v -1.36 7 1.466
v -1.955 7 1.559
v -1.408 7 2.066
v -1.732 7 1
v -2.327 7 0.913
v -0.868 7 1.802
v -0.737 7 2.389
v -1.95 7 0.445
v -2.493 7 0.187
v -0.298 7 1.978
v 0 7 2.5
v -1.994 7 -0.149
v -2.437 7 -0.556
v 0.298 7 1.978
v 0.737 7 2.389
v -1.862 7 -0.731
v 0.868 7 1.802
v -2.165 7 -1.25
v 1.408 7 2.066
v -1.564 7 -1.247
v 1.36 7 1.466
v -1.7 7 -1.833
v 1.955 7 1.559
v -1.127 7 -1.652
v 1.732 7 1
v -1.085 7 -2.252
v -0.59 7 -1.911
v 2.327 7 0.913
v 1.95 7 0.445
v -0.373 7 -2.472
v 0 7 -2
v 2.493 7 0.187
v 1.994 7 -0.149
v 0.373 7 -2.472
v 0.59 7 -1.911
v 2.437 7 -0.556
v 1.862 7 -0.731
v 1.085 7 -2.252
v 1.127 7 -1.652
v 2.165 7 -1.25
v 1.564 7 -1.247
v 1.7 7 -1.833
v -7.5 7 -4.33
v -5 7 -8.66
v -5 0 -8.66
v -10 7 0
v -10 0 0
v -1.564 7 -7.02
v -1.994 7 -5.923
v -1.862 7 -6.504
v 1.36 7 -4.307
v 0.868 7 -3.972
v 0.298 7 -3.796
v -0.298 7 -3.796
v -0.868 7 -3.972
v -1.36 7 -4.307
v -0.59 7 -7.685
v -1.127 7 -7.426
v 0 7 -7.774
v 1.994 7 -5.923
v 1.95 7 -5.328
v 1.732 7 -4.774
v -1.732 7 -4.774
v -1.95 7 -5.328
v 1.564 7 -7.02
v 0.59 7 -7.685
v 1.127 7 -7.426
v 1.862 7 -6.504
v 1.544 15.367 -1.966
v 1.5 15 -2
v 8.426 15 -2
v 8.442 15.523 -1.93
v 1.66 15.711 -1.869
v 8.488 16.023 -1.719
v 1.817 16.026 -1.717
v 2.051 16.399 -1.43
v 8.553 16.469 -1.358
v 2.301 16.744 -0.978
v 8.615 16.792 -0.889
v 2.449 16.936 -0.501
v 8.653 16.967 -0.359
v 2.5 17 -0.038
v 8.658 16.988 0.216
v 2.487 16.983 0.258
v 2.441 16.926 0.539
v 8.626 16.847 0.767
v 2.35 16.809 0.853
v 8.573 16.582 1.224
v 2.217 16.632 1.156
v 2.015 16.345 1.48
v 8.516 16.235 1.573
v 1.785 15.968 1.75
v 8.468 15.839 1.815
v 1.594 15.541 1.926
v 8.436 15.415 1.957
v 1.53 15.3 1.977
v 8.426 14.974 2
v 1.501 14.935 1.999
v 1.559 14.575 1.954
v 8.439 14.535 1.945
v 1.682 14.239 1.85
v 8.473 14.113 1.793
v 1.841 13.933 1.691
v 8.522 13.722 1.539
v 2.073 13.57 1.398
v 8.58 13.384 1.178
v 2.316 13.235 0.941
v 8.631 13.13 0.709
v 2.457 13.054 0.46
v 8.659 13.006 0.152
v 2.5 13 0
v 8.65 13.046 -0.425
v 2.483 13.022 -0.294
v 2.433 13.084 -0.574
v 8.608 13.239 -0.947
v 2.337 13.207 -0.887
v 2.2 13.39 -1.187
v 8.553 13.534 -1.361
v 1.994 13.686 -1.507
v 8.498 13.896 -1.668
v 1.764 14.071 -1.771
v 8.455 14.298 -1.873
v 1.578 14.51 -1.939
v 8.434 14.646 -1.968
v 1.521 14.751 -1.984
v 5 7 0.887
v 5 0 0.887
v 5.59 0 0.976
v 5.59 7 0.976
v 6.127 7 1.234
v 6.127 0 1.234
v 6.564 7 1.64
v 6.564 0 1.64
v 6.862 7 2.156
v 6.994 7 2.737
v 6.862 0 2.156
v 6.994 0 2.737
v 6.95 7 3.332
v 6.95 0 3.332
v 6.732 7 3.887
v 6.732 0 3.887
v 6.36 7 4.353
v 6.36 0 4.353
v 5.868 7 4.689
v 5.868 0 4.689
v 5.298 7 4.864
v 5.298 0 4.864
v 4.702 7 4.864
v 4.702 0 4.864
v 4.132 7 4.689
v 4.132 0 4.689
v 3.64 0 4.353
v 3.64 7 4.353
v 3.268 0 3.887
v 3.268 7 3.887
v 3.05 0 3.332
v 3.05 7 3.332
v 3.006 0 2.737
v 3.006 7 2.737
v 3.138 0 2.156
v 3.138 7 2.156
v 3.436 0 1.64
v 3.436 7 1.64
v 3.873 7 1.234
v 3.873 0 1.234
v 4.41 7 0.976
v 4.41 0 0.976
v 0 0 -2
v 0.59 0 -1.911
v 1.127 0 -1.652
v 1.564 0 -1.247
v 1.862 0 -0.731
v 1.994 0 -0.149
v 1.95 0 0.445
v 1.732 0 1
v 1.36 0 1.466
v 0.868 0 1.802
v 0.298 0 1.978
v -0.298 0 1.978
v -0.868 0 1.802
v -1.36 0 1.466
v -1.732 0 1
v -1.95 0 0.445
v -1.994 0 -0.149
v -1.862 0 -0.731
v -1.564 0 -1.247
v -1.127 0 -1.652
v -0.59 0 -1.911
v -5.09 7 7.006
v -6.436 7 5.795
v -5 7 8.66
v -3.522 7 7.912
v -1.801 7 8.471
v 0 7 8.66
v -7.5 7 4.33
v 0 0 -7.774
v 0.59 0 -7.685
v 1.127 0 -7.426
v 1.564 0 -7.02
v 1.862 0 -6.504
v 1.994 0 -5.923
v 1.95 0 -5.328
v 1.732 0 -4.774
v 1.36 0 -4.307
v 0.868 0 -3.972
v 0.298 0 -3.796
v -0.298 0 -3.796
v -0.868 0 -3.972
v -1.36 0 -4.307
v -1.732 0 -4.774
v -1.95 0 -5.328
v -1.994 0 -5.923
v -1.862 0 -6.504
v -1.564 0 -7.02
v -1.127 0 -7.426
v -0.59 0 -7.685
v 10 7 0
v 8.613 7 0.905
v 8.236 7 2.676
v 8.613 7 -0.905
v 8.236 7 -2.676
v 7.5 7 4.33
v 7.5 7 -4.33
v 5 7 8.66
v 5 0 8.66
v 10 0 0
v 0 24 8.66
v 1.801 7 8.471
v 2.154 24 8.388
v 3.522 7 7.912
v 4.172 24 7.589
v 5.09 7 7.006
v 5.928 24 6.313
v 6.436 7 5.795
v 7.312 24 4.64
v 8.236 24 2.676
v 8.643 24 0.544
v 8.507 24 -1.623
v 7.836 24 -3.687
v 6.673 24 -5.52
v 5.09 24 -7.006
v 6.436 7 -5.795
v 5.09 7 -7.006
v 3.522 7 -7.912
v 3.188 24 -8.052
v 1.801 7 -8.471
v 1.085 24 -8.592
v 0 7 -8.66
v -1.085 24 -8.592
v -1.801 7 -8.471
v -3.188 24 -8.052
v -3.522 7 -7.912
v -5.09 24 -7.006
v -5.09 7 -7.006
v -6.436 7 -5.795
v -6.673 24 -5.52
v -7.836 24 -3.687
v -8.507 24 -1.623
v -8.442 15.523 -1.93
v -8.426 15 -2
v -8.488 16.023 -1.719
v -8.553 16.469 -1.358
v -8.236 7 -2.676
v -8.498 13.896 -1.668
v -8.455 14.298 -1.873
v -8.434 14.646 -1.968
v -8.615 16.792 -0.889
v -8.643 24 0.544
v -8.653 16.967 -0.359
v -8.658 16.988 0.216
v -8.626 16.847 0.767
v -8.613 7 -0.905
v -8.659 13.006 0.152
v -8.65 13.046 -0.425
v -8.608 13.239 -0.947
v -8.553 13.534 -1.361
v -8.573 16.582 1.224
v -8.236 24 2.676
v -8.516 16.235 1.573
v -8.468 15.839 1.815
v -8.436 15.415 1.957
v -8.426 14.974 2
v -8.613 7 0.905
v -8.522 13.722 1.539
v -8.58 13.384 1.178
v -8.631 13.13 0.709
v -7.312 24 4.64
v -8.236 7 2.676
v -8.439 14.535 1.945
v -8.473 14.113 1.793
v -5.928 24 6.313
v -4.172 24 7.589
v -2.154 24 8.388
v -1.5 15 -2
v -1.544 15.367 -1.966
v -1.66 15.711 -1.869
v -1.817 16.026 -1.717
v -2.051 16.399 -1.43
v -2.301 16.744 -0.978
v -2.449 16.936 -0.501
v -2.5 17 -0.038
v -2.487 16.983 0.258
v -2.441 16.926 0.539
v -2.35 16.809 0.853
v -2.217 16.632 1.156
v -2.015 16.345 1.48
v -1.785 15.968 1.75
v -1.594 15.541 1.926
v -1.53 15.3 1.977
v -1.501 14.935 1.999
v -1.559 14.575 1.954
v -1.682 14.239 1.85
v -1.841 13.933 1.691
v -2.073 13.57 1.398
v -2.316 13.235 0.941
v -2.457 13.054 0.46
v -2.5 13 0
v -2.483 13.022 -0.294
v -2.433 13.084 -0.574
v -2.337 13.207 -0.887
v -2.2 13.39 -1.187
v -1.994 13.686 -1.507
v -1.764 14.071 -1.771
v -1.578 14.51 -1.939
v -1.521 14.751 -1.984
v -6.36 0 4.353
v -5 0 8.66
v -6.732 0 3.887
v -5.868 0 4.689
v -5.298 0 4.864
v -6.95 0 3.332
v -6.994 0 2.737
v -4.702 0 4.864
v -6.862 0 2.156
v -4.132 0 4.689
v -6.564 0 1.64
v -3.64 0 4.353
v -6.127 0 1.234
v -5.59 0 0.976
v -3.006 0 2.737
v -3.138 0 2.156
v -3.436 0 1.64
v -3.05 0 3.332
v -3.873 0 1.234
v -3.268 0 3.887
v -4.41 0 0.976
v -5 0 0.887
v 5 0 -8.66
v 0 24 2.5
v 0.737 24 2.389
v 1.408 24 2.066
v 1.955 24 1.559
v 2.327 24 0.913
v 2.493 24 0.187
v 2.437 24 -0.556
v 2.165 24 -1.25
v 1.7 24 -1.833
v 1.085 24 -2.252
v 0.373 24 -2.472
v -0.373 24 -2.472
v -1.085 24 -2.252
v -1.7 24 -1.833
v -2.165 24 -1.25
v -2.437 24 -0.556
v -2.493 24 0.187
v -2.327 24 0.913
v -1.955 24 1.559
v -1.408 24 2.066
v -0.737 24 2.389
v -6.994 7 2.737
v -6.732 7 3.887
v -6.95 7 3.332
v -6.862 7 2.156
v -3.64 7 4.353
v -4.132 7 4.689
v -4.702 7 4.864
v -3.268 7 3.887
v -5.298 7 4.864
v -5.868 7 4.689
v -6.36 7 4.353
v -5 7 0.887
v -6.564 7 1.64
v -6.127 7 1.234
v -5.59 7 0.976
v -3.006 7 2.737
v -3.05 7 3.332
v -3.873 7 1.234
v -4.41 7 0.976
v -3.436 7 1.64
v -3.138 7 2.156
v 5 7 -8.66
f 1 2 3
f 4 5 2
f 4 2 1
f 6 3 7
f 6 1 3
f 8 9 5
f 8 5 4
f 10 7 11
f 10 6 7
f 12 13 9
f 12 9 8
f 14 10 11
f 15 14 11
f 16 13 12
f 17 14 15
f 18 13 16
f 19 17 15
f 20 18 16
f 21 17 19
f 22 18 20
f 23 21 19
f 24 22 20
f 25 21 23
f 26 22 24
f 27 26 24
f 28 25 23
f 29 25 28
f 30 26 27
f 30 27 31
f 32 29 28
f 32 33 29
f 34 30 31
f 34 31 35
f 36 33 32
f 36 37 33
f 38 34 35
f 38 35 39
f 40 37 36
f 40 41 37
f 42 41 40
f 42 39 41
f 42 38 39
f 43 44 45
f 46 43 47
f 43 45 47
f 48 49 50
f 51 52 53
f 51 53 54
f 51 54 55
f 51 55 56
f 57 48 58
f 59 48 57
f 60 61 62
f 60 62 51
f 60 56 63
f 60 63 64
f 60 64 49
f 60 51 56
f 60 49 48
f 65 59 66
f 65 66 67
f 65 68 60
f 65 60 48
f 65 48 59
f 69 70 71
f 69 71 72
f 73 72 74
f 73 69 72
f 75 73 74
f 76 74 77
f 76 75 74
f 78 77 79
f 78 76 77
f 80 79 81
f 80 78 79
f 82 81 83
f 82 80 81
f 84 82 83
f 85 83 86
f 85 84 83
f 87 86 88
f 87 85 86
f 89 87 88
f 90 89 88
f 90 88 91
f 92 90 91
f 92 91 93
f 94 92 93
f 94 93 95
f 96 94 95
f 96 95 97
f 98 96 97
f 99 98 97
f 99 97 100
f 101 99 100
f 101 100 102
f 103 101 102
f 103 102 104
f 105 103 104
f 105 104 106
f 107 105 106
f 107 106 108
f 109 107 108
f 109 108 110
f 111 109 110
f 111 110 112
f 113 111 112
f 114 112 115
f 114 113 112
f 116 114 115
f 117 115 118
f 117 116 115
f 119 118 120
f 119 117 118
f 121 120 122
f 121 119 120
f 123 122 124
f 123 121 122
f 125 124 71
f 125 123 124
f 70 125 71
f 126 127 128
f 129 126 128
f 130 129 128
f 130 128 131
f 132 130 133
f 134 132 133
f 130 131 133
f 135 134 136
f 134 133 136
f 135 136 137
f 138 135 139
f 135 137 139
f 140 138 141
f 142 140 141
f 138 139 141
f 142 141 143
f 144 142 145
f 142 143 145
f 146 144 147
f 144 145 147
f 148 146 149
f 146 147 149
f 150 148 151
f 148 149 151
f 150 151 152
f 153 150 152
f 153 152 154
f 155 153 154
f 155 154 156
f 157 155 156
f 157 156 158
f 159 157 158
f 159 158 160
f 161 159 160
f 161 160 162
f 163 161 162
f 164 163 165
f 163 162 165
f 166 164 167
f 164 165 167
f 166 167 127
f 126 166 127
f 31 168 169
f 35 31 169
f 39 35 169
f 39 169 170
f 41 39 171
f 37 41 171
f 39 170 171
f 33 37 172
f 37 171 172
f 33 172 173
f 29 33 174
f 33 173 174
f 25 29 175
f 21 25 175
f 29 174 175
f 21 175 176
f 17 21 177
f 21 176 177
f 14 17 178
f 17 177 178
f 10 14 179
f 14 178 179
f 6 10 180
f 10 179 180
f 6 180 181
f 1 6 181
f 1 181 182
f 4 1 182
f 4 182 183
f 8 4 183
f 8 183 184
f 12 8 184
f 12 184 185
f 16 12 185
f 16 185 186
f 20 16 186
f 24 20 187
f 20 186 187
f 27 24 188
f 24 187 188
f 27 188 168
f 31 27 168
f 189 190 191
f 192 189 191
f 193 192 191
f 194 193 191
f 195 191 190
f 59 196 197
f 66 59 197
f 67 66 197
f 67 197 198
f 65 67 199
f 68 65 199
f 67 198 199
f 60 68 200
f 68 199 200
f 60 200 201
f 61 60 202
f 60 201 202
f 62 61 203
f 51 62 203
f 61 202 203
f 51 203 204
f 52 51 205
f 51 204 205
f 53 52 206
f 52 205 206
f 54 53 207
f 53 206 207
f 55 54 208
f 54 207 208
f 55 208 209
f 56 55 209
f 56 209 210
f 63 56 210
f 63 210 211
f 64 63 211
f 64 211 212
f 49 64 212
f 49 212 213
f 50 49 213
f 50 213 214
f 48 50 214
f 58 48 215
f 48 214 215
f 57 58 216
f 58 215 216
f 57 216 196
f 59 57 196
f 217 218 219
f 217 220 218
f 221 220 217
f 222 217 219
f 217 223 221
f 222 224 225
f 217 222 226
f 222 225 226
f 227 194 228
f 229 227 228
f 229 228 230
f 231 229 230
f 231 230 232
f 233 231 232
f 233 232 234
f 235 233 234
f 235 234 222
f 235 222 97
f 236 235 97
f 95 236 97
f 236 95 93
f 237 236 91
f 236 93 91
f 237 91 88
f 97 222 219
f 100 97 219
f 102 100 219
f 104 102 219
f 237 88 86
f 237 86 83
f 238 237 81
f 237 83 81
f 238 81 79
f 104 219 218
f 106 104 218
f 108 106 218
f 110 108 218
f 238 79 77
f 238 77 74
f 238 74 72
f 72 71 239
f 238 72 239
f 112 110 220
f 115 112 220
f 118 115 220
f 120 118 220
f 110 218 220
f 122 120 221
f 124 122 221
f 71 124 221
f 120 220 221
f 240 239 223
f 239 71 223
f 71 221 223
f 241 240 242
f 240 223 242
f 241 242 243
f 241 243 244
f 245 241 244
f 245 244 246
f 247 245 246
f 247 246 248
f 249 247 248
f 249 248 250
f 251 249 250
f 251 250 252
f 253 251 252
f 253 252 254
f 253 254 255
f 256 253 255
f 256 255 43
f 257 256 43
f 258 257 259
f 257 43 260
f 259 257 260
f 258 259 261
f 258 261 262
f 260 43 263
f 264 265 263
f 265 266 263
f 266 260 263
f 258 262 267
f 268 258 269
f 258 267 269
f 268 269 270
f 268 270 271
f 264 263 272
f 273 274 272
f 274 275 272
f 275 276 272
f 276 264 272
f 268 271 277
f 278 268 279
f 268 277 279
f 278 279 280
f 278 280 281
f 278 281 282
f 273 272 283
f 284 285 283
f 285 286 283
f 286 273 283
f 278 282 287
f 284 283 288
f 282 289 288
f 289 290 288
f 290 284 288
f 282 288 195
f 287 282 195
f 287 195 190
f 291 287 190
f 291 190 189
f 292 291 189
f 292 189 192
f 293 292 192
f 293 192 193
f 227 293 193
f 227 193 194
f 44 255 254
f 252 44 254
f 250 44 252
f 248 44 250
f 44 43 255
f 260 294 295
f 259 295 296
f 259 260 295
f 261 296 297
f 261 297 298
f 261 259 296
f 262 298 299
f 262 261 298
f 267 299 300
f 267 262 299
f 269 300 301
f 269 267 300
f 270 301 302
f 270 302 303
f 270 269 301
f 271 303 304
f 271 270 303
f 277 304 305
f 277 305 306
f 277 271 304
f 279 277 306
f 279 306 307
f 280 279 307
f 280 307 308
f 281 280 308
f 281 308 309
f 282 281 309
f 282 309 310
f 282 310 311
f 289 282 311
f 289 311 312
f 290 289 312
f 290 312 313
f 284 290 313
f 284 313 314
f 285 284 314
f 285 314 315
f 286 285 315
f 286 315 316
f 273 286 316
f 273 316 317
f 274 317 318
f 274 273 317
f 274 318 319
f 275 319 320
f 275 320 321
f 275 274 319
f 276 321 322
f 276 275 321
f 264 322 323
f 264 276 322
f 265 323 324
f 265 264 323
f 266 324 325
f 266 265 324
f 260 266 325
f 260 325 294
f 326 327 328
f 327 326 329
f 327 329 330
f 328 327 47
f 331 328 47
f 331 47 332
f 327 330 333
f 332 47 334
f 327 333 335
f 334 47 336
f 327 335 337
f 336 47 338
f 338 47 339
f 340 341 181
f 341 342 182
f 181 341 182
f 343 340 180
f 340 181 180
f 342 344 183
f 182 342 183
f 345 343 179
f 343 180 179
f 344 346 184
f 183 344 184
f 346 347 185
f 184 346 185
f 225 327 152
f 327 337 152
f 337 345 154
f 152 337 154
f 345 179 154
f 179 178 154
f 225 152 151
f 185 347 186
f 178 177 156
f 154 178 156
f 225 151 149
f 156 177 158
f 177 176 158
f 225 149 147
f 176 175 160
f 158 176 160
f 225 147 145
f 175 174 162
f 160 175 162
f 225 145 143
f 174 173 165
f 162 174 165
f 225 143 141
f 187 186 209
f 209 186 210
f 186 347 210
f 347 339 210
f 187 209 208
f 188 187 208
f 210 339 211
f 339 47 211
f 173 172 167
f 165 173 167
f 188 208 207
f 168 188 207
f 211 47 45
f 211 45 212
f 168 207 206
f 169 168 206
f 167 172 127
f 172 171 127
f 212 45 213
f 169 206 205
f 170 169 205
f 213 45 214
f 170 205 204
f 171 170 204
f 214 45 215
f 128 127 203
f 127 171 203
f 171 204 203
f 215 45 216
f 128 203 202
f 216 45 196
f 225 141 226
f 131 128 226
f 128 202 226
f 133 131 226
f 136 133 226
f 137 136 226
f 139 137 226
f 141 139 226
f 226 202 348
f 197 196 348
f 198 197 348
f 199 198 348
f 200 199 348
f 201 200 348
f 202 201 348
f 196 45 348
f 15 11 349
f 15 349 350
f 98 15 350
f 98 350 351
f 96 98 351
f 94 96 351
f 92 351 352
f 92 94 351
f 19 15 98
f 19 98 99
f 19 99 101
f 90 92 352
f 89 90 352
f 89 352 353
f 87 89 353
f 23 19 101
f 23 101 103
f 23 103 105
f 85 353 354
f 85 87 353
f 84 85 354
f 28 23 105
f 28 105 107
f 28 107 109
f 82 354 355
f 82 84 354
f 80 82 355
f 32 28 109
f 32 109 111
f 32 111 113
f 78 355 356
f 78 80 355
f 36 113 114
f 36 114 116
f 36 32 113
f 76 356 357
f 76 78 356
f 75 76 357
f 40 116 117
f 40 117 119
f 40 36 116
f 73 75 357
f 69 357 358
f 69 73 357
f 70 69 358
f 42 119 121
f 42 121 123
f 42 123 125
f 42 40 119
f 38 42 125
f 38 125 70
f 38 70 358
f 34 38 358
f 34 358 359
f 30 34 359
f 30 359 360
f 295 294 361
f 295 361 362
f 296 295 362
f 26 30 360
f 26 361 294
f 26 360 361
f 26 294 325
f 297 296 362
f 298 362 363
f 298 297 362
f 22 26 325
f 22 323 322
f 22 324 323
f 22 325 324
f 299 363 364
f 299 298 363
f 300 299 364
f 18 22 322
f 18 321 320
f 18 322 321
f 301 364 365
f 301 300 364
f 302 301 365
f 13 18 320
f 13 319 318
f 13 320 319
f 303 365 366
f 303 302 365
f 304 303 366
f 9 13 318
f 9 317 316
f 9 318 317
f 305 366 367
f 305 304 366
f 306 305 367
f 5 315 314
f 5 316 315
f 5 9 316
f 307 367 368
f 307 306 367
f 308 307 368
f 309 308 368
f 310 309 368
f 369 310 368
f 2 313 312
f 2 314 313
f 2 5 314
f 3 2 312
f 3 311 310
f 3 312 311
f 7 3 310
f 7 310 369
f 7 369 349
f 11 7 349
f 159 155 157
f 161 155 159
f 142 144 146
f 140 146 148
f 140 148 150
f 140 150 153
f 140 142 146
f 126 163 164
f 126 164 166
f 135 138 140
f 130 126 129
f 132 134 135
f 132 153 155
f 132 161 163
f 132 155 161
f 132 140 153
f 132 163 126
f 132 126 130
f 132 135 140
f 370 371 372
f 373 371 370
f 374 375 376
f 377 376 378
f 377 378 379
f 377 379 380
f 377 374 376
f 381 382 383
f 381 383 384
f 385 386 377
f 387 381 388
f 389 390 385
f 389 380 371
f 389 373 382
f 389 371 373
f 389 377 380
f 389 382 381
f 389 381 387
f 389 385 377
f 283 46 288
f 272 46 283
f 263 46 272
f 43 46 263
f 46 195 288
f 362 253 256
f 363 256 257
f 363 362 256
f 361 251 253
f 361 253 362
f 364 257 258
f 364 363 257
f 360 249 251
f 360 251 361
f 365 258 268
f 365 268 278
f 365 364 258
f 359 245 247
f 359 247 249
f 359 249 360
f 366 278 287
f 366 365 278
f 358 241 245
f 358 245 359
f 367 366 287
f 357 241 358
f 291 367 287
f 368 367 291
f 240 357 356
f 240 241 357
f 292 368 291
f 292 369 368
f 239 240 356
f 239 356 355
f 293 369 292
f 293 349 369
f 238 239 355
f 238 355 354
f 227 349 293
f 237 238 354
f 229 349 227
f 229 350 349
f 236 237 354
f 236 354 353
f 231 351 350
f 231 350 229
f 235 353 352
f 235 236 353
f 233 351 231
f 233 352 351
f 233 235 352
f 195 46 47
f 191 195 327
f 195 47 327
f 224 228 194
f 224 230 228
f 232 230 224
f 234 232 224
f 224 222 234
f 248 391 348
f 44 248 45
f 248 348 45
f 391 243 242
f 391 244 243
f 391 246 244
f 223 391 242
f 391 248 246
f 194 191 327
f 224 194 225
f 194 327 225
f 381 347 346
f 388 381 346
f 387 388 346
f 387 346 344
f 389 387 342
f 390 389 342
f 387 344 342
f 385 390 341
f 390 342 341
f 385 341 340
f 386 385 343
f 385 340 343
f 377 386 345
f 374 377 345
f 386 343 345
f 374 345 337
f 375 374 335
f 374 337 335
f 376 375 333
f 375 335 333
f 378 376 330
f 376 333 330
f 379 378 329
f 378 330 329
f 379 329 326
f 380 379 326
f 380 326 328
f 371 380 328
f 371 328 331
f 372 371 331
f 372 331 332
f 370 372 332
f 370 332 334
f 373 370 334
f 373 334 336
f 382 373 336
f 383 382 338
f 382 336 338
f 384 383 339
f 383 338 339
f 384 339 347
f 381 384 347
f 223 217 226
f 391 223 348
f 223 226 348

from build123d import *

# Parameters (mm, degrees)
EXTRUDE_1_DEPTH          = 7
SKETCH_5_R               = 8.660254038
SKETCH_5_R_2             = 2.5
EXTRUDE_2_DEPTH          = 17
SKETCH_2_R               = 2
CUT_EXTRUDE_4_DEPTH      = 7
CUT_EXTRUDE_5_DEPTH      = 28.404379212
CUT_EXTRUDE_5_DEPTH_BACK = 28.404379212
SKETCH_6_R               = 2


with BuildPart() as part:
    # 草图1 → 凸台-拉伸1 (new body)
    with BuildSketch(Plane(origin=(0, 0, 0), x_dir=(1, 0, 0), z_dir=(0, 1, 0))):
        Polygon((10, 0), (5, 8.660254038), (-5, 8.660254038), (-10, 0), (-5, -8.660254038), (5, -8.660254038), align=None)
    extrude(amount=EXTRUDE_1_DEPTH)

    # 草图5 → 凸台-拉伸2 (add)
    with BuildSketch(Plane(origin=(0, 7, 0), x_dir=(1, 0, 0), z_dir=(0, 1, 0))):
        with Locations(Location((0, 0, 0), (0, 0, 270))):
            Circle(SKETCH_5_R)
        with Locations(Location((0, 0, 0), (0, 0, 270))):
            Circle(SKETCH_5_R_2, mode=Mode.SUBTRACT)
    extrude(amount=EXTRUDE_2_DEPTH)

    # 草图2 → 切除-拉伸4 (cut)
    with BuildSketch(Plane.XZ):
        with Locations(Location((0, 0, 0), (0, 0, 270))):
            Circle(SKETCH_2_R)
        with Locations(Location((-5, 2.886751346, 0), (0, 0, 270))):
            Circle(SKETCH_2_R)
        with Locations(Location((5, 2.886751346, 0), (0, 0, 270))):
            Circle(SKETCH_2_R)
        with Locations(Location((0, -5.773502692, 0), (0, 0, 270))):
            Circle(SKETCH_2_R)
    extrude(amount=-CUT_EXTRUDE_4_DEPTH, mode=Mode.SUBTRACT)

    # 草图6 → 切除-拉伸5 (cut, two sides: drawn at the far end of the back side and taken through both)
    with BuildSketch(Plane(origin=(0, 0, 0), x_dir=(0, 0, -1), z_dir=(1, 0, 0)).offset(-CUT_EXTRUDE_5_DEPTH_BACK)):
        with Locations((0, 15)):
            Circle(SKETCH_6_R)
    extrude(amount=CUT_EXTRUDE_5_DEPTH + CUT_EXTRUDE_5_DEPTH_BACK, mode=Mode.SUBTRACT)


solid = part.part
